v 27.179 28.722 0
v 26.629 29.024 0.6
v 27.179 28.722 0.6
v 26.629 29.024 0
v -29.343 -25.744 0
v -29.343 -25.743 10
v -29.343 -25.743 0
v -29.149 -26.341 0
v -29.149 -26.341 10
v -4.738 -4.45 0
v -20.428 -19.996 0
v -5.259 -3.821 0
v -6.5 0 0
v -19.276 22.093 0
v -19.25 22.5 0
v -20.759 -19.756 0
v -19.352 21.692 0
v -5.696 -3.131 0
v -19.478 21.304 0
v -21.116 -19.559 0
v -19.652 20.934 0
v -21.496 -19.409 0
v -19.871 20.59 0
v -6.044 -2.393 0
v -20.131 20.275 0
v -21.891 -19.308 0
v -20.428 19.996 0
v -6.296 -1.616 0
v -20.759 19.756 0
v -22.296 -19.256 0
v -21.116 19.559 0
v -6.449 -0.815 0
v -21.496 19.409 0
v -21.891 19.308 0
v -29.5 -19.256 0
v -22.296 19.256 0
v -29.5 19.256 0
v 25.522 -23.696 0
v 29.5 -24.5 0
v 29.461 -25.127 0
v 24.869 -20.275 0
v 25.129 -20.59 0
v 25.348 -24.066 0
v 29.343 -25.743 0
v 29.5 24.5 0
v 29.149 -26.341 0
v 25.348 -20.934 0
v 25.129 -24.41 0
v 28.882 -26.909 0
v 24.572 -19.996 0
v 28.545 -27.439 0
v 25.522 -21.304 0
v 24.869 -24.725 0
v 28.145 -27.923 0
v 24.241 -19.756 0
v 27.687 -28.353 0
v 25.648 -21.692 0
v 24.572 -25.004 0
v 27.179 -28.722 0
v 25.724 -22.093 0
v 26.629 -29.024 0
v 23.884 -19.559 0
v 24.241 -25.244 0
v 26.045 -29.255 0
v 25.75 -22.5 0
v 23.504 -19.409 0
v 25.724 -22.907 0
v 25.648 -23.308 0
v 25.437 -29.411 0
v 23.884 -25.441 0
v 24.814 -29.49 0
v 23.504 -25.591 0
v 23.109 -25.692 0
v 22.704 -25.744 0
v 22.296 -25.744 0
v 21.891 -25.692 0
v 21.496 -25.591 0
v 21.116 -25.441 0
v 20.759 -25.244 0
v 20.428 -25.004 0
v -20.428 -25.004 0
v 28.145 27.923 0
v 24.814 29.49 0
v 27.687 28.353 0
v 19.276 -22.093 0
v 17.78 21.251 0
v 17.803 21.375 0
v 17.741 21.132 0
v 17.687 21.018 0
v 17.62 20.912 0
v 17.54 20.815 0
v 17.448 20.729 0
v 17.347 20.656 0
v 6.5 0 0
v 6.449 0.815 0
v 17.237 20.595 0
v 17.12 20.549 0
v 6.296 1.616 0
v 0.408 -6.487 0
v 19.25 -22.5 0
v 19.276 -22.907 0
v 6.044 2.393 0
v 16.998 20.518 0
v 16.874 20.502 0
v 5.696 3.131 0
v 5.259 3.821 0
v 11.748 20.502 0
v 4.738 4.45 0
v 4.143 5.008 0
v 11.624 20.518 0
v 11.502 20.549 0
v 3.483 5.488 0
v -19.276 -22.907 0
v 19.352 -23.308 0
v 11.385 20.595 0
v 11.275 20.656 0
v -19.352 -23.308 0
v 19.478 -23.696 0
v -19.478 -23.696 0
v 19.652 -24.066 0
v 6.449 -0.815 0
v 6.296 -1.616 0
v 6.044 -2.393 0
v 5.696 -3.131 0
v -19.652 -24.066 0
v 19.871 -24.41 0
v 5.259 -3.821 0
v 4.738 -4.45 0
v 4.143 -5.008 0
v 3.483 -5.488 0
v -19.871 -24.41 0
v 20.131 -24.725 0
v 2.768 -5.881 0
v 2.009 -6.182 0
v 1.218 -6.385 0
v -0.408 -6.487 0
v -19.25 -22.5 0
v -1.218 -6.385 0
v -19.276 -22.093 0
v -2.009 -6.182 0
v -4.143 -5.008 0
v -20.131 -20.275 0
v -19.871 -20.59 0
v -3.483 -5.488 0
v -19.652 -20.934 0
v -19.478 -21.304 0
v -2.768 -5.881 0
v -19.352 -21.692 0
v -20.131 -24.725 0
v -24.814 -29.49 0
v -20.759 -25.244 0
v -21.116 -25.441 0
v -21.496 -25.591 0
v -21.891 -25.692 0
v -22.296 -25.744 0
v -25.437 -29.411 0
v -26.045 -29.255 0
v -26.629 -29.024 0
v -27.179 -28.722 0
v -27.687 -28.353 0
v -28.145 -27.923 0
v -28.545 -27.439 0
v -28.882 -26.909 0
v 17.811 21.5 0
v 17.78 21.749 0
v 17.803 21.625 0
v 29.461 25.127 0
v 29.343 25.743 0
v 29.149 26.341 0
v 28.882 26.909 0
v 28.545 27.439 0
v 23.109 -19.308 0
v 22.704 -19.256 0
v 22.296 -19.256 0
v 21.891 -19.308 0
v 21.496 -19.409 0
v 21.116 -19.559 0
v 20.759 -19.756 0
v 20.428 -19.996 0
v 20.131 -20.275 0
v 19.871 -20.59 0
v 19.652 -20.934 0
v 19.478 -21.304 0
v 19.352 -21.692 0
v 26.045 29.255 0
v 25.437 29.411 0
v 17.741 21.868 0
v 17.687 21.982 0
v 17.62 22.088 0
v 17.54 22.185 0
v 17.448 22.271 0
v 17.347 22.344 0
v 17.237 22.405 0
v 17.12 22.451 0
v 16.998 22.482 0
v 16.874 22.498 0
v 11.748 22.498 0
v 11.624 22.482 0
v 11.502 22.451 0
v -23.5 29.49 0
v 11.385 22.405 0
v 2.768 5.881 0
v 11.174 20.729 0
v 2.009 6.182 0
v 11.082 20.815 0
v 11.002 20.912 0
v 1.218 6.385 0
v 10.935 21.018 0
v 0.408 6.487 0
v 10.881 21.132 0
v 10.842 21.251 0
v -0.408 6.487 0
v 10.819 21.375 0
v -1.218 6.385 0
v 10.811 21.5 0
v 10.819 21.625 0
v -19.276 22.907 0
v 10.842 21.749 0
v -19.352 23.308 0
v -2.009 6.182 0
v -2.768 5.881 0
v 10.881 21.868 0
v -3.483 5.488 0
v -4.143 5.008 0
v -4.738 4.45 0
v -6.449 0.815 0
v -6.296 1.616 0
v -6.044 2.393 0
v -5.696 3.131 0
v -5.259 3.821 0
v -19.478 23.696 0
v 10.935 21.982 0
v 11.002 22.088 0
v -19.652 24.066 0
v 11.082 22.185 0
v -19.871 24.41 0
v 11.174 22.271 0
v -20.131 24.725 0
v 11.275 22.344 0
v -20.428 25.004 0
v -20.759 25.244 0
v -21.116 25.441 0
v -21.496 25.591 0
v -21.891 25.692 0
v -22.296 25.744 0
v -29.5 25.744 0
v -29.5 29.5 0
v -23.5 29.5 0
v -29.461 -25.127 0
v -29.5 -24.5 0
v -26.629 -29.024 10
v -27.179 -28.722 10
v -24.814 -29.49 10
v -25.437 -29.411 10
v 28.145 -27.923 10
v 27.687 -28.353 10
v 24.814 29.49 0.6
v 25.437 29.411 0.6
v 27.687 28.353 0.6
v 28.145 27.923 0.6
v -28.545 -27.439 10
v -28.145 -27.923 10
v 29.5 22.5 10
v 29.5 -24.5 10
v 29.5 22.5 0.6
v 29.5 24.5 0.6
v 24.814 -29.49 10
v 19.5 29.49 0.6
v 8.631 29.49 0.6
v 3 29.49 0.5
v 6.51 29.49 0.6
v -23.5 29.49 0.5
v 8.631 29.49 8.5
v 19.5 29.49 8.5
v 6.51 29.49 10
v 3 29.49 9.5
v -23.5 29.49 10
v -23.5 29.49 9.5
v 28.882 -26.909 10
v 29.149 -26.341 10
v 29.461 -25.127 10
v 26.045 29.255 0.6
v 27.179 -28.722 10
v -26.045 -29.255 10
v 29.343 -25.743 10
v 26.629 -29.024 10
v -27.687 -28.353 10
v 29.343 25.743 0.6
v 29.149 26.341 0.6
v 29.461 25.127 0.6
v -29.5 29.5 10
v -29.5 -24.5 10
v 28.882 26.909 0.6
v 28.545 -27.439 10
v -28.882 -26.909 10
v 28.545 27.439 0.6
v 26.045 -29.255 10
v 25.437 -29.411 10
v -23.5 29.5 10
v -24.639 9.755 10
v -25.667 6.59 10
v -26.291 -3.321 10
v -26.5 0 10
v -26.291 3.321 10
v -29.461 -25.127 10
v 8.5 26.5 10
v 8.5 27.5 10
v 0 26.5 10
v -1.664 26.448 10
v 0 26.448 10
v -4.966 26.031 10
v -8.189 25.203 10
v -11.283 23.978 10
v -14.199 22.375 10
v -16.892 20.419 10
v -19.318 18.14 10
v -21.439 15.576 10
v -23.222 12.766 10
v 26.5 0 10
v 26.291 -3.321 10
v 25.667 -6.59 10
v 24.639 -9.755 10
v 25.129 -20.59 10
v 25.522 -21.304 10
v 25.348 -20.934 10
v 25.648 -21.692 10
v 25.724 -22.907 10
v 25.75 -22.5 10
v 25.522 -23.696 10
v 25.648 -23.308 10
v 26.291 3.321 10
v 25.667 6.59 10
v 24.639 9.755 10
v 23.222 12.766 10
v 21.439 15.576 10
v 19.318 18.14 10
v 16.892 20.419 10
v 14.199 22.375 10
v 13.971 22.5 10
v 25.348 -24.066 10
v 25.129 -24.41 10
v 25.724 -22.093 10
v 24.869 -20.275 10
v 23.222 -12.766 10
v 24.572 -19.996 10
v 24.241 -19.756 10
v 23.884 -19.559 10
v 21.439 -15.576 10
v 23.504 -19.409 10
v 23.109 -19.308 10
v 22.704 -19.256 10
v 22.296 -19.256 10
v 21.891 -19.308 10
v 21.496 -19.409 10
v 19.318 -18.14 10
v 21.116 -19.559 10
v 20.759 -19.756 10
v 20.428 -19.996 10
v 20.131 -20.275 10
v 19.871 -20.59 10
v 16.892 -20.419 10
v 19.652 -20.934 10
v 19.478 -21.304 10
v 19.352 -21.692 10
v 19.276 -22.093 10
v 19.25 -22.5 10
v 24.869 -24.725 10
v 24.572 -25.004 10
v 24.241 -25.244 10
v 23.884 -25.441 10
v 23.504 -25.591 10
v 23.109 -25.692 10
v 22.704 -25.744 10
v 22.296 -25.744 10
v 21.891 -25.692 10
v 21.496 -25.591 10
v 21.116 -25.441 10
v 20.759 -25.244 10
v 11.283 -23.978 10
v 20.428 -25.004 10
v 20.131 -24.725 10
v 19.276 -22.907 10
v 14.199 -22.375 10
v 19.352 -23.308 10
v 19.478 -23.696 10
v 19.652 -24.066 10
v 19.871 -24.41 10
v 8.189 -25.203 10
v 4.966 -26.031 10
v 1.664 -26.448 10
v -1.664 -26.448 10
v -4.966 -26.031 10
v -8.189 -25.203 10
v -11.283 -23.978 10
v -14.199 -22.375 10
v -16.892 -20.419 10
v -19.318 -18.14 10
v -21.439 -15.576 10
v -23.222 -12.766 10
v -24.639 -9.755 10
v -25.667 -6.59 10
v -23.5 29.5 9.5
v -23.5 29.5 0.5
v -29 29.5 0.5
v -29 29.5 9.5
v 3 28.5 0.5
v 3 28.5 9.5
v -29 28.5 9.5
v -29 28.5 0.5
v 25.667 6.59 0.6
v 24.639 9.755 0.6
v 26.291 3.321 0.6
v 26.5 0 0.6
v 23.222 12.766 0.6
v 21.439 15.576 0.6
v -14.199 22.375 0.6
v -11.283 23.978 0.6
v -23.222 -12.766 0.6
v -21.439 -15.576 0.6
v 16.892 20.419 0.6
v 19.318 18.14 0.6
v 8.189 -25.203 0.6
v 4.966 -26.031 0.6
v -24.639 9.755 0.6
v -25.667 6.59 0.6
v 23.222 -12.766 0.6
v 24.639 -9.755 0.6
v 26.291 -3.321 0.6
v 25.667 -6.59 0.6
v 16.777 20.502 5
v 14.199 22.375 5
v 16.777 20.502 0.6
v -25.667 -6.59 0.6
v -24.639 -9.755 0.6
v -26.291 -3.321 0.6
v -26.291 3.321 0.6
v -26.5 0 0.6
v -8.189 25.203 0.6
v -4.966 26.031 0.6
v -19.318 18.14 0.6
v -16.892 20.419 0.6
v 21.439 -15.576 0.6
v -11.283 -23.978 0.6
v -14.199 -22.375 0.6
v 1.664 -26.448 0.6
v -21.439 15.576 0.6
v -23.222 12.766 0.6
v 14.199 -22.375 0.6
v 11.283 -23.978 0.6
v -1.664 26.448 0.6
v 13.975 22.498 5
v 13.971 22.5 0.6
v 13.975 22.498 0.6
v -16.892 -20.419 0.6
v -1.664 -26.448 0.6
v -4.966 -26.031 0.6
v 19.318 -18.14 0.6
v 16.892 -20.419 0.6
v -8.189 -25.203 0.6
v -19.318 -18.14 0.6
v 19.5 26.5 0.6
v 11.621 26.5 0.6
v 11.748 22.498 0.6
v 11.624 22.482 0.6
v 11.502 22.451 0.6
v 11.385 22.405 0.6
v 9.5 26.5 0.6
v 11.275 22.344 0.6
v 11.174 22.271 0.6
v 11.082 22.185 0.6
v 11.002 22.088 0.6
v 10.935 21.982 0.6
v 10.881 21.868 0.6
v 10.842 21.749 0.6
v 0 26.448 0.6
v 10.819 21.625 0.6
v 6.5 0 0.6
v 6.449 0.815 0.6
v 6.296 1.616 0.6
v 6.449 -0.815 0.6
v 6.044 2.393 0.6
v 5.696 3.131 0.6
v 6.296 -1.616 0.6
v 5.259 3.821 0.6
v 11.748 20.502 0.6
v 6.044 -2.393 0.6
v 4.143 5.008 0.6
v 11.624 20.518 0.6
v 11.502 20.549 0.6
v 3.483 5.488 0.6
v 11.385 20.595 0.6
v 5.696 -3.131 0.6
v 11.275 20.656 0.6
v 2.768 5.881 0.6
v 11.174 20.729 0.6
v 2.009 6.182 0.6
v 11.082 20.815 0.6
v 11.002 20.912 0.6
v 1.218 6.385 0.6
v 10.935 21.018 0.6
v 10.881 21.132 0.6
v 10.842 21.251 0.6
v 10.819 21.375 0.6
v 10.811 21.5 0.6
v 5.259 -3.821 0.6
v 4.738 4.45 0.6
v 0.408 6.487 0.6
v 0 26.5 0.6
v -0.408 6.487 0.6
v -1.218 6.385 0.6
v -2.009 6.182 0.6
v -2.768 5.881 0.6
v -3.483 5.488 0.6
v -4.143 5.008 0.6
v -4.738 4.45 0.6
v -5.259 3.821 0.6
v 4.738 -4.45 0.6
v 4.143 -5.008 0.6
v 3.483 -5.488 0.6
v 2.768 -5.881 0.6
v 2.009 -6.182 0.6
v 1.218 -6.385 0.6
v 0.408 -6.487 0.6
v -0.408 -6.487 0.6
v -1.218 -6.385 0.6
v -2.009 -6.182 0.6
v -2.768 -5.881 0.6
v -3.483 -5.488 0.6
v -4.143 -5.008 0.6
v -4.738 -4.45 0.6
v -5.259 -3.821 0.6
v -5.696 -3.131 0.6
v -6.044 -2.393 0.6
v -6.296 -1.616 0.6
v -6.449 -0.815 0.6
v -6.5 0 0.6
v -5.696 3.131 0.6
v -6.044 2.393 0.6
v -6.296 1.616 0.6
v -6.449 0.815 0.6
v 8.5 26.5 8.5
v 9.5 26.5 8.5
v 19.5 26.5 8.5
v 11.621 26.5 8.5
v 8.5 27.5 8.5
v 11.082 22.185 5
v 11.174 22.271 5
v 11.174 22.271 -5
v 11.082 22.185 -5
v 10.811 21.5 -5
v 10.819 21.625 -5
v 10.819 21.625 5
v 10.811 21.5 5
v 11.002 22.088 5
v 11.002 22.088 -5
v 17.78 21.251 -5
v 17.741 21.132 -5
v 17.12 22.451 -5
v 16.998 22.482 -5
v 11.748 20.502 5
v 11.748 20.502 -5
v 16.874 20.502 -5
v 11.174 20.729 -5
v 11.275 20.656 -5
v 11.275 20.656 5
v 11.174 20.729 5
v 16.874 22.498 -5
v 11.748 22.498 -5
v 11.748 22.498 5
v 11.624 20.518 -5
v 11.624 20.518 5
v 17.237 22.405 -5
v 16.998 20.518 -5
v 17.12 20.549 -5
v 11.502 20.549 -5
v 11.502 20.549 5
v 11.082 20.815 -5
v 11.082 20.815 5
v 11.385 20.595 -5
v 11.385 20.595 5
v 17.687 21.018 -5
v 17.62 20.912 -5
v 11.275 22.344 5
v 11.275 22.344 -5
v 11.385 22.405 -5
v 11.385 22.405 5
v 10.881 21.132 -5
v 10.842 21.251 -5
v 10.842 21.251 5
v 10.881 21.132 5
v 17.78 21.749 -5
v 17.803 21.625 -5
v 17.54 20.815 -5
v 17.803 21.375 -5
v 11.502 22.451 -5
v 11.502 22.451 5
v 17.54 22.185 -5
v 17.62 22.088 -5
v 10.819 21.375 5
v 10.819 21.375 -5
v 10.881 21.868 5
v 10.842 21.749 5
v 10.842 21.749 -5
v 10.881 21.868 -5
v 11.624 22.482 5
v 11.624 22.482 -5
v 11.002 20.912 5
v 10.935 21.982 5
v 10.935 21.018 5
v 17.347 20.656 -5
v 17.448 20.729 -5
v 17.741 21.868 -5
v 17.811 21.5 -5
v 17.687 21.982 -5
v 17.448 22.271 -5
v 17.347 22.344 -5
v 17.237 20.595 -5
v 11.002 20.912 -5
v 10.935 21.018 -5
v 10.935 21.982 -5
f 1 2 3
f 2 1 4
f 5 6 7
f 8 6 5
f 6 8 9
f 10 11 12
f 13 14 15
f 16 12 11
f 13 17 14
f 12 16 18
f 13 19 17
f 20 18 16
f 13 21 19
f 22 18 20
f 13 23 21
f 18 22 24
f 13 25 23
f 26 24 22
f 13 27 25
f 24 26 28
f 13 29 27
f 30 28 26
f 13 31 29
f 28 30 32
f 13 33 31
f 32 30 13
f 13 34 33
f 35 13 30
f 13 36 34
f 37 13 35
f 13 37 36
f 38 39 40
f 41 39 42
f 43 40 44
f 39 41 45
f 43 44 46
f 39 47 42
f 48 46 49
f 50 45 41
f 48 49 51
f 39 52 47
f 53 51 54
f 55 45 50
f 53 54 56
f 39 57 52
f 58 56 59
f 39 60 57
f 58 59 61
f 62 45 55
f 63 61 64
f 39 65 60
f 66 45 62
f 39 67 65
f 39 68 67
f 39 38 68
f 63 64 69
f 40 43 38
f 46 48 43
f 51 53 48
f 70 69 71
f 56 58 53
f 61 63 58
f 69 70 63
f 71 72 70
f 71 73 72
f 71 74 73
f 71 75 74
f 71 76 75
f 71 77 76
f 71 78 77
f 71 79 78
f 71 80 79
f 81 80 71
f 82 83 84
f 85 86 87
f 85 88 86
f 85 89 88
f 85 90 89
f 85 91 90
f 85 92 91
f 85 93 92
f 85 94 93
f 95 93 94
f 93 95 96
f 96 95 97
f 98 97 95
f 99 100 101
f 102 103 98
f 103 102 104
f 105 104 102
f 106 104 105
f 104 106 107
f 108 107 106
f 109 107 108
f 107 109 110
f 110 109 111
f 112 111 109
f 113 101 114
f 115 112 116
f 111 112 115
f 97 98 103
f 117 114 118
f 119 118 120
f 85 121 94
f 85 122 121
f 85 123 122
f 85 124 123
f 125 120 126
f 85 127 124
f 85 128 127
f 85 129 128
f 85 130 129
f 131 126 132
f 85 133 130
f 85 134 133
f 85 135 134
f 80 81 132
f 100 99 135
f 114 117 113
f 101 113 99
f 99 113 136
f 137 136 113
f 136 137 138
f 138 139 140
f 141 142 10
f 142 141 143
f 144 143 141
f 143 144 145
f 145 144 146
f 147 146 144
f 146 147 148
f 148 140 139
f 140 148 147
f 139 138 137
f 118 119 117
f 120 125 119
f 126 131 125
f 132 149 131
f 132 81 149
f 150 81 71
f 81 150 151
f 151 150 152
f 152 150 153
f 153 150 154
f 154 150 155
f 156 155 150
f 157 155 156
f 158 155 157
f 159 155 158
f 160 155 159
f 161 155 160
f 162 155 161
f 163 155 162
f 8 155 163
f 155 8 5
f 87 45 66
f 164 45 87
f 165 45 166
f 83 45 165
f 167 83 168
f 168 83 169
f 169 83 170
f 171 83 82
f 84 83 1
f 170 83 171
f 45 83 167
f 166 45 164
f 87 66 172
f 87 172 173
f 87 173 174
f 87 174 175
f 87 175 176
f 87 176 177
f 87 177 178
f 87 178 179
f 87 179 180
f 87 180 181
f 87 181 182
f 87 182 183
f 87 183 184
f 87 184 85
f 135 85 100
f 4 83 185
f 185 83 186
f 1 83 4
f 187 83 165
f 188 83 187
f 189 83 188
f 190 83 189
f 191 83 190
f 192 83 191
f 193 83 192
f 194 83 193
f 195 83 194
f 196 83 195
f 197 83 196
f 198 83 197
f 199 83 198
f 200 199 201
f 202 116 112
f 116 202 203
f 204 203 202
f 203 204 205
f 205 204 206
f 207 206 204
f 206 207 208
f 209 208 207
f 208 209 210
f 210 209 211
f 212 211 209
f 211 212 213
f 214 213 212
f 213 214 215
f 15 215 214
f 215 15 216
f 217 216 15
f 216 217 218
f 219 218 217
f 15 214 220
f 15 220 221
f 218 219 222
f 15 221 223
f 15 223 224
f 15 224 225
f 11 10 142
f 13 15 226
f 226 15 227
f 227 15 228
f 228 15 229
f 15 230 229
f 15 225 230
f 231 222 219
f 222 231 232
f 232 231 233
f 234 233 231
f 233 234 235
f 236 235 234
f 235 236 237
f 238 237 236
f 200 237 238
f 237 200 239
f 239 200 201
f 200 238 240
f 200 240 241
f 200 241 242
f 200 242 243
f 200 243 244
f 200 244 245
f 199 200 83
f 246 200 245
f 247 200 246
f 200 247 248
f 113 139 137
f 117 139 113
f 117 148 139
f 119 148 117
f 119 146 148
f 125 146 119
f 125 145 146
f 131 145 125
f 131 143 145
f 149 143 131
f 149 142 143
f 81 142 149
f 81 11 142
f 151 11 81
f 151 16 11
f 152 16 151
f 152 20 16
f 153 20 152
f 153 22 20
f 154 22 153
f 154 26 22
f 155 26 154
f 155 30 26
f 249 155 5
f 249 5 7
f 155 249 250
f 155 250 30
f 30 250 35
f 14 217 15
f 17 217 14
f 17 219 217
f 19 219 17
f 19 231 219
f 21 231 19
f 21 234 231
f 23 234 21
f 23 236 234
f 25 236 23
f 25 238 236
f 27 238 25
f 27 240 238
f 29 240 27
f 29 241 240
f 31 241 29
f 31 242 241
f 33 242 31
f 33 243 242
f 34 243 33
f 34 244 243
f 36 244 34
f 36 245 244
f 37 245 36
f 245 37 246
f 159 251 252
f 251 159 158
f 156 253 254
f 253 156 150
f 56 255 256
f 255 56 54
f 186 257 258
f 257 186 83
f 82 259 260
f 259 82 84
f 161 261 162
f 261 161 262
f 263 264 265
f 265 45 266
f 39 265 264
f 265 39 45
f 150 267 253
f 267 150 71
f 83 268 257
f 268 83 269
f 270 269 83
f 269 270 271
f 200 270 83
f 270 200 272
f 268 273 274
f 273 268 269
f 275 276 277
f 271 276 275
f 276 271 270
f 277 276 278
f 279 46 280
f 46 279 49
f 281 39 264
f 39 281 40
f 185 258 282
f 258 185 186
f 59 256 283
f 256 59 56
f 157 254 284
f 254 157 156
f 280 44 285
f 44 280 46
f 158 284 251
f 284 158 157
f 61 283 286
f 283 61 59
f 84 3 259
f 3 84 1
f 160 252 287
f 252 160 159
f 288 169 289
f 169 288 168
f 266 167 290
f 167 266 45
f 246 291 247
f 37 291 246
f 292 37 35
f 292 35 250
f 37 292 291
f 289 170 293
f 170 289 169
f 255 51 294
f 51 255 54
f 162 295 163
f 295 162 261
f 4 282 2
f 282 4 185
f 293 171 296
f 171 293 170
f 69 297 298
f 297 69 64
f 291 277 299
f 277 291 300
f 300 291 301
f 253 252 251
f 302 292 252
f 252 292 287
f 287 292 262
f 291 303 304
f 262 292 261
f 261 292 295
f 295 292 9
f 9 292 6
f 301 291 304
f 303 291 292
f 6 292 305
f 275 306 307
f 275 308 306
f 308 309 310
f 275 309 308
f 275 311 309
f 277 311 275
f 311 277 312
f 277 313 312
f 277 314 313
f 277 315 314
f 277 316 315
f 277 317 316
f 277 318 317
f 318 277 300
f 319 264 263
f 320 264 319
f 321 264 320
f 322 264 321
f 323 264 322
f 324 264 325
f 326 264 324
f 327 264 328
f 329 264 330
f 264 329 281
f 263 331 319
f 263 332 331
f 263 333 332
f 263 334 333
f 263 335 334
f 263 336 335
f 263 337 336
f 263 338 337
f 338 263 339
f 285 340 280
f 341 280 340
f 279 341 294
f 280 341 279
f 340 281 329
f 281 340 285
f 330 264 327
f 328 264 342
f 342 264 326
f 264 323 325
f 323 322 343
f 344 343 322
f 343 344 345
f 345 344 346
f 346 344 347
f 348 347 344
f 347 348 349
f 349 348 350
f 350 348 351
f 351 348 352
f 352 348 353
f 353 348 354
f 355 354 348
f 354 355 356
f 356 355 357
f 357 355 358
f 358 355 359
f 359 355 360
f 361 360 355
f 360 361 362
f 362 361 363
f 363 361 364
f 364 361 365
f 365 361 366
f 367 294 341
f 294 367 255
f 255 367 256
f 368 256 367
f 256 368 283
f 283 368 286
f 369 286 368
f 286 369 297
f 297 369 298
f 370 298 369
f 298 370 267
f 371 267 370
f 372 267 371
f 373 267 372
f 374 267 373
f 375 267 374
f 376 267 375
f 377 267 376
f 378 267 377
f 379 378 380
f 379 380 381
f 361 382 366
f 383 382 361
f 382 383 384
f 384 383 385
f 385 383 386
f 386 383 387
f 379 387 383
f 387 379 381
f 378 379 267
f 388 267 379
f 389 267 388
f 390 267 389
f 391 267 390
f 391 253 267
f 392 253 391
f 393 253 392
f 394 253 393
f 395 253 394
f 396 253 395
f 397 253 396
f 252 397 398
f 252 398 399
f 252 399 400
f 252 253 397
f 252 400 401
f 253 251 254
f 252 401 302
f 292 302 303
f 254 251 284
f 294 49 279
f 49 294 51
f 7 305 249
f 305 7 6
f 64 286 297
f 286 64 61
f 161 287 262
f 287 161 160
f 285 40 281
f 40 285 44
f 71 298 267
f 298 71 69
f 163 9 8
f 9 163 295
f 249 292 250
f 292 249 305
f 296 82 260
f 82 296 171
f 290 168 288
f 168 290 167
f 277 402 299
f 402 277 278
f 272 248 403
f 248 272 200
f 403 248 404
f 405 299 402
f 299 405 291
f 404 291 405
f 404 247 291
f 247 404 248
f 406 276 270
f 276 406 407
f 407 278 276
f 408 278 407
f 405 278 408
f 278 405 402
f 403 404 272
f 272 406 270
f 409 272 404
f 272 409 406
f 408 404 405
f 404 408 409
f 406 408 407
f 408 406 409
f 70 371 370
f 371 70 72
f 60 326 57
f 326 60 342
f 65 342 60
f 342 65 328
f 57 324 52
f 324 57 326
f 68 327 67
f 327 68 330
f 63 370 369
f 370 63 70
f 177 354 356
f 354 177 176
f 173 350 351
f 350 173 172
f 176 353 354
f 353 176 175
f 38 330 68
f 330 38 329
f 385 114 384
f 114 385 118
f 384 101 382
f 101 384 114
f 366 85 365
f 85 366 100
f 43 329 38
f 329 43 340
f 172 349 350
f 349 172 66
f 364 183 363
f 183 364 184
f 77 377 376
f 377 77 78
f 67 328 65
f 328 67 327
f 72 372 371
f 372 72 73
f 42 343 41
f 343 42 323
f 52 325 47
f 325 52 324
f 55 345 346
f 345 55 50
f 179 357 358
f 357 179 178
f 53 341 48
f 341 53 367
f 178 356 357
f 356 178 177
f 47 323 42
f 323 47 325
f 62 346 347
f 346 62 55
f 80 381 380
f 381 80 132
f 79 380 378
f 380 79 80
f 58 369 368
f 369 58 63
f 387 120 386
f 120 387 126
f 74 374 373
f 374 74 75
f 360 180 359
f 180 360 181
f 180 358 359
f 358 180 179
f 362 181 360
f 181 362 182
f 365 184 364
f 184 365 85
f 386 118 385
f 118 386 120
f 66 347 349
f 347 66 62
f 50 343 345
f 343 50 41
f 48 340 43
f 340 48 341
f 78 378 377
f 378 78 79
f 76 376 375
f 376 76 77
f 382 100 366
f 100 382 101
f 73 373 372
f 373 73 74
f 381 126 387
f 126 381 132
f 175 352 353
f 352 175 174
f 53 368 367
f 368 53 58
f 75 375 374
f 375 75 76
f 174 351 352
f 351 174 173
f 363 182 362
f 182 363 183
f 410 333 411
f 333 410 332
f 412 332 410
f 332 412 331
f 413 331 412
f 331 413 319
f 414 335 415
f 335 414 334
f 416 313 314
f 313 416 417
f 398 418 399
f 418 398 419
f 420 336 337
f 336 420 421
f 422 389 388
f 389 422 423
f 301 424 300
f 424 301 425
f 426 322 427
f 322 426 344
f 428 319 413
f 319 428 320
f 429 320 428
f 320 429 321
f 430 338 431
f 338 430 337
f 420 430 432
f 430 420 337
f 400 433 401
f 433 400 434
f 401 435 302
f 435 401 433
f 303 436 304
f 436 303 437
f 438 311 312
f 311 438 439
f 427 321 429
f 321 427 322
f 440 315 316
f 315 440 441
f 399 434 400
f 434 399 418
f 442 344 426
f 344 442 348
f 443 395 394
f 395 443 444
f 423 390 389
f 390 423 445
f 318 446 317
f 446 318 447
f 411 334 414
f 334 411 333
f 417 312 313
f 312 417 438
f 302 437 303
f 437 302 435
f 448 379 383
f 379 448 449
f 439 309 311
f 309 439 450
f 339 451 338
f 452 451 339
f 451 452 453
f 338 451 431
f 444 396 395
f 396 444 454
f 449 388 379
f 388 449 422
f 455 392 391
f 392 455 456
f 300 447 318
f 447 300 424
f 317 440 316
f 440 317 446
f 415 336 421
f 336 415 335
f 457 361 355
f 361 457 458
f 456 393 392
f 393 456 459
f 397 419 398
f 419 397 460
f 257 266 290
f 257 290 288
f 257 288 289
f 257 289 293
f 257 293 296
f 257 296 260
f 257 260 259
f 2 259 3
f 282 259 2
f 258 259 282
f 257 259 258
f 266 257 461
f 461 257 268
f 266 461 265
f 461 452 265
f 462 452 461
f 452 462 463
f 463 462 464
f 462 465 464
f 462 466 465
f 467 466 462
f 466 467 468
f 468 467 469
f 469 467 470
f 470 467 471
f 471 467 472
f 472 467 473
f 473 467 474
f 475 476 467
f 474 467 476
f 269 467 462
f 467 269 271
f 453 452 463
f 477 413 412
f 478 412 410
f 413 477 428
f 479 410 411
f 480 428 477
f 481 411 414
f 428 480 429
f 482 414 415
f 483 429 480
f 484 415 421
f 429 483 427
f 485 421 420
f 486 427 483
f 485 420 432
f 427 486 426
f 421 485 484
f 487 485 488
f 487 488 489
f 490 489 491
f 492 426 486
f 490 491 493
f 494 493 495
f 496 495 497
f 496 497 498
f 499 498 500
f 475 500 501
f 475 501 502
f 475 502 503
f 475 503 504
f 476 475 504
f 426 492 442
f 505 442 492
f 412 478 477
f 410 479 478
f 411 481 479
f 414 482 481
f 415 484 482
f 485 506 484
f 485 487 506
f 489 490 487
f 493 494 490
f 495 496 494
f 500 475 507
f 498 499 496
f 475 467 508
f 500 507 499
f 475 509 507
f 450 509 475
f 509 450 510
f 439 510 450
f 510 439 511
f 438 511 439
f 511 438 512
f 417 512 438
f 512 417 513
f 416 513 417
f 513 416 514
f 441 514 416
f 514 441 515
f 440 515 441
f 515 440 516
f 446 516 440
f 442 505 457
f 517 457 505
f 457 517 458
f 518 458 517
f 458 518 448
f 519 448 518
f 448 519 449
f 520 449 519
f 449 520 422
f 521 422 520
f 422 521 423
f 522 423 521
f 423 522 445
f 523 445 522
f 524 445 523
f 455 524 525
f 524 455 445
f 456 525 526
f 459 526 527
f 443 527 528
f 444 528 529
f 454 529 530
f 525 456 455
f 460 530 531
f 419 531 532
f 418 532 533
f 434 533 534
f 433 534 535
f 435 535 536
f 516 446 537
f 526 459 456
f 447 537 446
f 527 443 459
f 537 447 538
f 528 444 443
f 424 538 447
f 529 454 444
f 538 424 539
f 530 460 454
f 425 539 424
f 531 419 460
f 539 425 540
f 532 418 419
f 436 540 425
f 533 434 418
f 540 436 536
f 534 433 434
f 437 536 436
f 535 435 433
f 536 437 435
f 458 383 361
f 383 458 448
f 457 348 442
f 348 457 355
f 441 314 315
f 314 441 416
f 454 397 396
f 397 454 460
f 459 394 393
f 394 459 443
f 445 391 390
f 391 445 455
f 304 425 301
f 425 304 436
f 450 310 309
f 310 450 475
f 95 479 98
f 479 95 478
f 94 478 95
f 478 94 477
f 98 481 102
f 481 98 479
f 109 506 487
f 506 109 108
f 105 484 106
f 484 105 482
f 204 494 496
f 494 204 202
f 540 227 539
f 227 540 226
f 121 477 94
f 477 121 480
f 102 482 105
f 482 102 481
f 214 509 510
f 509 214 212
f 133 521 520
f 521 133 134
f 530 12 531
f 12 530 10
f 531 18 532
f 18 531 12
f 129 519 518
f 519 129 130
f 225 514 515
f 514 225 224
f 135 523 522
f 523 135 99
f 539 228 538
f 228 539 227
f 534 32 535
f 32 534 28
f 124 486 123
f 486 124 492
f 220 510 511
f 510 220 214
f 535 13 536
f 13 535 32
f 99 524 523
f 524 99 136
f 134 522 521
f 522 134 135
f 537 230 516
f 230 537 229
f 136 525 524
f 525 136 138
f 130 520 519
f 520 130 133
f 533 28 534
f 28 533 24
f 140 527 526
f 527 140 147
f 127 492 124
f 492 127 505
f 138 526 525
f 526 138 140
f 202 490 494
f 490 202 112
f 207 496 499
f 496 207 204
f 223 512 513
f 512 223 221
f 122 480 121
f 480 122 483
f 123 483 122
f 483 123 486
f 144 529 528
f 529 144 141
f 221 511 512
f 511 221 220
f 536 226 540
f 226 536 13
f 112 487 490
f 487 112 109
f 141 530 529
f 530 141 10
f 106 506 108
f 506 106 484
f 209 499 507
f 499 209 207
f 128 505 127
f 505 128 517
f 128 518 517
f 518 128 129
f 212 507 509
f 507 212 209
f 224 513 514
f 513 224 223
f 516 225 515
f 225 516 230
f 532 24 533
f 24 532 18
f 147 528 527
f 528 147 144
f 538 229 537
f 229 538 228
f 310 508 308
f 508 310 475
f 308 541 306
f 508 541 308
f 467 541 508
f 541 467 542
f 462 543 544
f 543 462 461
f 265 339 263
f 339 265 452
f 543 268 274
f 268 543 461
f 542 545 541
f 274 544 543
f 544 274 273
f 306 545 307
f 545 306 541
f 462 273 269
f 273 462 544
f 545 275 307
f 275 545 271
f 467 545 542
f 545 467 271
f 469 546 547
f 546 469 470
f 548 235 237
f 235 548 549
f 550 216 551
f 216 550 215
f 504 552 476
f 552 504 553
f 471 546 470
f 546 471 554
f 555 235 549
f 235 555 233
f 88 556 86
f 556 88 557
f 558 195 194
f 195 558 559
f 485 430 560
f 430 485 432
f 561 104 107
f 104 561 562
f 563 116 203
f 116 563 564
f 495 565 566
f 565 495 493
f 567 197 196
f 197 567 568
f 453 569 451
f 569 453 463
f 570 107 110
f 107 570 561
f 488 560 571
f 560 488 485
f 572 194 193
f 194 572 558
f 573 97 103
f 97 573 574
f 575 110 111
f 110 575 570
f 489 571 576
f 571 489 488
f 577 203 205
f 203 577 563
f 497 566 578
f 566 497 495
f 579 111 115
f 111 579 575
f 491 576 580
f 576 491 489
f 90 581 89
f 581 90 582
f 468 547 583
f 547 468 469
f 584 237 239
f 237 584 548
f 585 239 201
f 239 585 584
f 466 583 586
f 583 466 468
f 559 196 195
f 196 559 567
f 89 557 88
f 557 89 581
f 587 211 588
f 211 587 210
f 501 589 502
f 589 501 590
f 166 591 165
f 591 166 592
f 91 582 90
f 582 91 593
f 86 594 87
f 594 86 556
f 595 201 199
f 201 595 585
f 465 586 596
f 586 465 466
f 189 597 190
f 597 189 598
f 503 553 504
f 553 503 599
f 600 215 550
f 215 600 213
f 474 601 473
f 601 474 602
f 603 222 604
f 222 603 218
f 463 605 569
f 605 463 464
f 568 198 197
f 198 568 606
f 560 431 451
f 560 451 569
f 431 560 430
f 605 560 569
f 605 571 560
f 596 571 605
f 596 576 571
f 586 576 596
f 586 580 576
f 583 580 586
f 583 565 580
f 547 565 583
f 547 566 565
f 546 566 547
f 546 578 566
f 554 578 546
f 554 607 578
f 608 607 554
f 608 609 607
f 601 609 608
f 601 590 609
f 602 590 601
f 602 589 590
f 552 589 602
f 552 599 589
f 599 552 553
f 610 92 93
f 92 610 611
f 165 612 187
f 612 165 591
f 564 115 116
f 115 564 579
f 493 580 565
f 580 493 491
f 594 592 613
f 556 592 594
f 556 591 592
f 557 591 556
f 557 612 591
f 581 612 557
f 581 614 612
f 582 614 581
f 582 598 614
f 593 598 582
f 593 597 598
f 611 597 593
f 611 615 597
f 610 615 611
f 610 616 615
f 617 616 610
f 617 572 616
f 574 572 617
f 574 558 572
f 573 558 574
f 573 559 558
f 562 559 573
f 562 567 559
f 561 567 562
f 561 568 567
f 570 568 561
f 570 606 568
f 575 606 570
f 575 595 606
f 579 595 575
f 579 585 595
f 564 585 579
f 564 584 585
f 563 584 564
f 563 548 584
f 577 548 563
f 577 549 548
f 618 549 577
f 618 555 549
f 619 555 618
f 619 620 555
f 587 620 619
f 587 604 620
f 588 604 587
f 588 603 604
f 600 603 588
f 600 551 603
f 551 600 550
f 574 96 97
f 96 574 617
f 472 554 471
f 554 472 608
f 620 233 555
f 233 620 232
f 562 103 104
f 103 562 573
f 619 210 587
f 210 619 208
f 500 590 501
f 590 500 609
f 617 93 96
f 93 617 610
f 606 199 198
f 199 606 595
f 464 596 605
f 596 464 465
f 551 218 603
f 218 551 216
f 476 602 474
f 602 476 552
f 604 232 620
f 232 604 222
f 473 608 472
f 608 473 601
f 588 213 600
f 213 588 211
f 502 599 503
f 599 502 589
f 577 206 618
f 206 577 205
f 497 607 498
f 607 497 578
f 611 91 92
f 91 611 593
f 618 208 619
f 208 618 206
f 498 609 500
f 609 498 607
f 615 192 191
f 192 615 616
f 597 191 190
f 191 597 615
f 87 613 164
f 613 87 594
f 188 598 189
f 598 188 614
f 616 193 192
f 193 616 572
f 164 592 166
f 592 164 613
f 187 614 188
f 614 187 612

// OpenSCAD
$fn = 50;


union() {
	difference() {
		union() {
			hull() {
				translate(v = [-24.5000000000, 24.5000000000, 0]) {
					cylinder(h = 10, r = 5);
				}
				translate(v = [24.5000000000, 24.5000000000, 0]) {
					cylinder(h = 10, r = 5);
				}
				translate(v = [-24.5000000000, -24.5000000000, 0]) {
					cylinder(h = 10, r = 5);
				}
				translate(v = [24.5000000000, -24.5000000000, 0]) {
					cylinder(h = 10, r = 5);
				}
			}
			translate(v = [-29.5000000000, 23.5000000000, 0]) {
				cube(size = [6, 6, 10]);
			}
		}
		union() {
			translate(v = [-30.0000000000, -22.5000000000, -250.0000000000]) {
				rotate(a = [0, 0, 0]) {
					difference() {
						union() {
							hull() {
								translate(v = [7.5000000000, 0, 0]) {
									cylinder(h = 250, r = 3.2500000000, r1 = 3.2500000000, r2 = 3.2500000000);
								}
								translate(v = [-7.5000000000, 0, 0]) {
									cylinder(h = 250, r = 3.2500000000, r1 = 3.2500000000, r2 = 3.2500000000);
								}
							}
						}
						union();
					}
				}
			}
			translate(v = [-30.0000000000, 22.5000000000, -250.0000000000]) {
				rotate(a = [0, 0, 0]) {
					difference() {
						union() {
							hull() {
								translate(v = [7.5000000000, 0, 0]) {
									cylinder(h = 250, r = 3.2500000000, r1 = 3.2500000000, r2 = 3.2500000000);
								}
								translate(v = [-7.5000000000, 0, 0]) {
									cylinder(h = 250, r = 3.2500000000, r1 = 3.2500000000, r2 = 3.2500000000);
								}
							}
						}
						union();
					}
				}
			}
			translate(v = [-29.0000000000, 28.5000000000, 0.5000000000]) {
				cube(size = [32, 1, 9.0000000000]);
			}
			translate(v = [22.5000000000, -22.5000000000, 0]) {
				cylinder(h = 100, r = 3.2500000000);
			}
			translate(v = [0, 0, 0.6000000000]) {
				cylinder(h = 12.4000000000, r = 26.5000000000);
			}
			translate(v = [0, 0, -5.0000000000]) {
				cylinder(h = 10, r = 6.5000000000);
			}
			translate(v = [0.0000000000, 22.5000000000, 0.6000000000]) {
				cube(size = [29.5000000000, 4, 12.4000000000]);
			}
			translate(v = [19.5000000000, 22.5000000000, 0.6000000000]) {
				cube(size = [10, 7, 12.4000000000]);
			}
			translate(v = [8.5000000000, 22.5000000000, 8.5000000000]) {
				cube(size = [21, 7, 1.5000000000]);
			}
			translate(v = [5.7500000000, 30.2500000000, 0.6000000000]) {
				rotate(a = [0, 0, -45]) {
					cube(size = [7.5000000000, 1.5000000000, 12.4000000000]);
				}
			}
			translate(v = [5.0610000000, 20.5000000000, 0.6000000000]) {
				cube(size = [7.5000000000, 2, 9.4000000000]);
			}
		}
	}
	union() {
		translate(v = [14.3110000000, 21.5000000000, -5.0000000000]) {
			rotate(a = [0, 0, 0]) {
				difference() {
					union() {
						#hull() {
							#translate(v = [2.5000000000, 0, 0]) {
								cylinder(h = 10, r = 1.0000000000, r1 = 1.0000000000, r2 = 1.0000000000);
							}
							#translate(v = [-2.5000000000, 0, 0]) {
								cylinder(h = 10, r = 1.0000000000, r1 = 1.0000000000, r2 = 1.0000000000);
							}
						}
					}
					union();
				}
			}
		}
	}
}
